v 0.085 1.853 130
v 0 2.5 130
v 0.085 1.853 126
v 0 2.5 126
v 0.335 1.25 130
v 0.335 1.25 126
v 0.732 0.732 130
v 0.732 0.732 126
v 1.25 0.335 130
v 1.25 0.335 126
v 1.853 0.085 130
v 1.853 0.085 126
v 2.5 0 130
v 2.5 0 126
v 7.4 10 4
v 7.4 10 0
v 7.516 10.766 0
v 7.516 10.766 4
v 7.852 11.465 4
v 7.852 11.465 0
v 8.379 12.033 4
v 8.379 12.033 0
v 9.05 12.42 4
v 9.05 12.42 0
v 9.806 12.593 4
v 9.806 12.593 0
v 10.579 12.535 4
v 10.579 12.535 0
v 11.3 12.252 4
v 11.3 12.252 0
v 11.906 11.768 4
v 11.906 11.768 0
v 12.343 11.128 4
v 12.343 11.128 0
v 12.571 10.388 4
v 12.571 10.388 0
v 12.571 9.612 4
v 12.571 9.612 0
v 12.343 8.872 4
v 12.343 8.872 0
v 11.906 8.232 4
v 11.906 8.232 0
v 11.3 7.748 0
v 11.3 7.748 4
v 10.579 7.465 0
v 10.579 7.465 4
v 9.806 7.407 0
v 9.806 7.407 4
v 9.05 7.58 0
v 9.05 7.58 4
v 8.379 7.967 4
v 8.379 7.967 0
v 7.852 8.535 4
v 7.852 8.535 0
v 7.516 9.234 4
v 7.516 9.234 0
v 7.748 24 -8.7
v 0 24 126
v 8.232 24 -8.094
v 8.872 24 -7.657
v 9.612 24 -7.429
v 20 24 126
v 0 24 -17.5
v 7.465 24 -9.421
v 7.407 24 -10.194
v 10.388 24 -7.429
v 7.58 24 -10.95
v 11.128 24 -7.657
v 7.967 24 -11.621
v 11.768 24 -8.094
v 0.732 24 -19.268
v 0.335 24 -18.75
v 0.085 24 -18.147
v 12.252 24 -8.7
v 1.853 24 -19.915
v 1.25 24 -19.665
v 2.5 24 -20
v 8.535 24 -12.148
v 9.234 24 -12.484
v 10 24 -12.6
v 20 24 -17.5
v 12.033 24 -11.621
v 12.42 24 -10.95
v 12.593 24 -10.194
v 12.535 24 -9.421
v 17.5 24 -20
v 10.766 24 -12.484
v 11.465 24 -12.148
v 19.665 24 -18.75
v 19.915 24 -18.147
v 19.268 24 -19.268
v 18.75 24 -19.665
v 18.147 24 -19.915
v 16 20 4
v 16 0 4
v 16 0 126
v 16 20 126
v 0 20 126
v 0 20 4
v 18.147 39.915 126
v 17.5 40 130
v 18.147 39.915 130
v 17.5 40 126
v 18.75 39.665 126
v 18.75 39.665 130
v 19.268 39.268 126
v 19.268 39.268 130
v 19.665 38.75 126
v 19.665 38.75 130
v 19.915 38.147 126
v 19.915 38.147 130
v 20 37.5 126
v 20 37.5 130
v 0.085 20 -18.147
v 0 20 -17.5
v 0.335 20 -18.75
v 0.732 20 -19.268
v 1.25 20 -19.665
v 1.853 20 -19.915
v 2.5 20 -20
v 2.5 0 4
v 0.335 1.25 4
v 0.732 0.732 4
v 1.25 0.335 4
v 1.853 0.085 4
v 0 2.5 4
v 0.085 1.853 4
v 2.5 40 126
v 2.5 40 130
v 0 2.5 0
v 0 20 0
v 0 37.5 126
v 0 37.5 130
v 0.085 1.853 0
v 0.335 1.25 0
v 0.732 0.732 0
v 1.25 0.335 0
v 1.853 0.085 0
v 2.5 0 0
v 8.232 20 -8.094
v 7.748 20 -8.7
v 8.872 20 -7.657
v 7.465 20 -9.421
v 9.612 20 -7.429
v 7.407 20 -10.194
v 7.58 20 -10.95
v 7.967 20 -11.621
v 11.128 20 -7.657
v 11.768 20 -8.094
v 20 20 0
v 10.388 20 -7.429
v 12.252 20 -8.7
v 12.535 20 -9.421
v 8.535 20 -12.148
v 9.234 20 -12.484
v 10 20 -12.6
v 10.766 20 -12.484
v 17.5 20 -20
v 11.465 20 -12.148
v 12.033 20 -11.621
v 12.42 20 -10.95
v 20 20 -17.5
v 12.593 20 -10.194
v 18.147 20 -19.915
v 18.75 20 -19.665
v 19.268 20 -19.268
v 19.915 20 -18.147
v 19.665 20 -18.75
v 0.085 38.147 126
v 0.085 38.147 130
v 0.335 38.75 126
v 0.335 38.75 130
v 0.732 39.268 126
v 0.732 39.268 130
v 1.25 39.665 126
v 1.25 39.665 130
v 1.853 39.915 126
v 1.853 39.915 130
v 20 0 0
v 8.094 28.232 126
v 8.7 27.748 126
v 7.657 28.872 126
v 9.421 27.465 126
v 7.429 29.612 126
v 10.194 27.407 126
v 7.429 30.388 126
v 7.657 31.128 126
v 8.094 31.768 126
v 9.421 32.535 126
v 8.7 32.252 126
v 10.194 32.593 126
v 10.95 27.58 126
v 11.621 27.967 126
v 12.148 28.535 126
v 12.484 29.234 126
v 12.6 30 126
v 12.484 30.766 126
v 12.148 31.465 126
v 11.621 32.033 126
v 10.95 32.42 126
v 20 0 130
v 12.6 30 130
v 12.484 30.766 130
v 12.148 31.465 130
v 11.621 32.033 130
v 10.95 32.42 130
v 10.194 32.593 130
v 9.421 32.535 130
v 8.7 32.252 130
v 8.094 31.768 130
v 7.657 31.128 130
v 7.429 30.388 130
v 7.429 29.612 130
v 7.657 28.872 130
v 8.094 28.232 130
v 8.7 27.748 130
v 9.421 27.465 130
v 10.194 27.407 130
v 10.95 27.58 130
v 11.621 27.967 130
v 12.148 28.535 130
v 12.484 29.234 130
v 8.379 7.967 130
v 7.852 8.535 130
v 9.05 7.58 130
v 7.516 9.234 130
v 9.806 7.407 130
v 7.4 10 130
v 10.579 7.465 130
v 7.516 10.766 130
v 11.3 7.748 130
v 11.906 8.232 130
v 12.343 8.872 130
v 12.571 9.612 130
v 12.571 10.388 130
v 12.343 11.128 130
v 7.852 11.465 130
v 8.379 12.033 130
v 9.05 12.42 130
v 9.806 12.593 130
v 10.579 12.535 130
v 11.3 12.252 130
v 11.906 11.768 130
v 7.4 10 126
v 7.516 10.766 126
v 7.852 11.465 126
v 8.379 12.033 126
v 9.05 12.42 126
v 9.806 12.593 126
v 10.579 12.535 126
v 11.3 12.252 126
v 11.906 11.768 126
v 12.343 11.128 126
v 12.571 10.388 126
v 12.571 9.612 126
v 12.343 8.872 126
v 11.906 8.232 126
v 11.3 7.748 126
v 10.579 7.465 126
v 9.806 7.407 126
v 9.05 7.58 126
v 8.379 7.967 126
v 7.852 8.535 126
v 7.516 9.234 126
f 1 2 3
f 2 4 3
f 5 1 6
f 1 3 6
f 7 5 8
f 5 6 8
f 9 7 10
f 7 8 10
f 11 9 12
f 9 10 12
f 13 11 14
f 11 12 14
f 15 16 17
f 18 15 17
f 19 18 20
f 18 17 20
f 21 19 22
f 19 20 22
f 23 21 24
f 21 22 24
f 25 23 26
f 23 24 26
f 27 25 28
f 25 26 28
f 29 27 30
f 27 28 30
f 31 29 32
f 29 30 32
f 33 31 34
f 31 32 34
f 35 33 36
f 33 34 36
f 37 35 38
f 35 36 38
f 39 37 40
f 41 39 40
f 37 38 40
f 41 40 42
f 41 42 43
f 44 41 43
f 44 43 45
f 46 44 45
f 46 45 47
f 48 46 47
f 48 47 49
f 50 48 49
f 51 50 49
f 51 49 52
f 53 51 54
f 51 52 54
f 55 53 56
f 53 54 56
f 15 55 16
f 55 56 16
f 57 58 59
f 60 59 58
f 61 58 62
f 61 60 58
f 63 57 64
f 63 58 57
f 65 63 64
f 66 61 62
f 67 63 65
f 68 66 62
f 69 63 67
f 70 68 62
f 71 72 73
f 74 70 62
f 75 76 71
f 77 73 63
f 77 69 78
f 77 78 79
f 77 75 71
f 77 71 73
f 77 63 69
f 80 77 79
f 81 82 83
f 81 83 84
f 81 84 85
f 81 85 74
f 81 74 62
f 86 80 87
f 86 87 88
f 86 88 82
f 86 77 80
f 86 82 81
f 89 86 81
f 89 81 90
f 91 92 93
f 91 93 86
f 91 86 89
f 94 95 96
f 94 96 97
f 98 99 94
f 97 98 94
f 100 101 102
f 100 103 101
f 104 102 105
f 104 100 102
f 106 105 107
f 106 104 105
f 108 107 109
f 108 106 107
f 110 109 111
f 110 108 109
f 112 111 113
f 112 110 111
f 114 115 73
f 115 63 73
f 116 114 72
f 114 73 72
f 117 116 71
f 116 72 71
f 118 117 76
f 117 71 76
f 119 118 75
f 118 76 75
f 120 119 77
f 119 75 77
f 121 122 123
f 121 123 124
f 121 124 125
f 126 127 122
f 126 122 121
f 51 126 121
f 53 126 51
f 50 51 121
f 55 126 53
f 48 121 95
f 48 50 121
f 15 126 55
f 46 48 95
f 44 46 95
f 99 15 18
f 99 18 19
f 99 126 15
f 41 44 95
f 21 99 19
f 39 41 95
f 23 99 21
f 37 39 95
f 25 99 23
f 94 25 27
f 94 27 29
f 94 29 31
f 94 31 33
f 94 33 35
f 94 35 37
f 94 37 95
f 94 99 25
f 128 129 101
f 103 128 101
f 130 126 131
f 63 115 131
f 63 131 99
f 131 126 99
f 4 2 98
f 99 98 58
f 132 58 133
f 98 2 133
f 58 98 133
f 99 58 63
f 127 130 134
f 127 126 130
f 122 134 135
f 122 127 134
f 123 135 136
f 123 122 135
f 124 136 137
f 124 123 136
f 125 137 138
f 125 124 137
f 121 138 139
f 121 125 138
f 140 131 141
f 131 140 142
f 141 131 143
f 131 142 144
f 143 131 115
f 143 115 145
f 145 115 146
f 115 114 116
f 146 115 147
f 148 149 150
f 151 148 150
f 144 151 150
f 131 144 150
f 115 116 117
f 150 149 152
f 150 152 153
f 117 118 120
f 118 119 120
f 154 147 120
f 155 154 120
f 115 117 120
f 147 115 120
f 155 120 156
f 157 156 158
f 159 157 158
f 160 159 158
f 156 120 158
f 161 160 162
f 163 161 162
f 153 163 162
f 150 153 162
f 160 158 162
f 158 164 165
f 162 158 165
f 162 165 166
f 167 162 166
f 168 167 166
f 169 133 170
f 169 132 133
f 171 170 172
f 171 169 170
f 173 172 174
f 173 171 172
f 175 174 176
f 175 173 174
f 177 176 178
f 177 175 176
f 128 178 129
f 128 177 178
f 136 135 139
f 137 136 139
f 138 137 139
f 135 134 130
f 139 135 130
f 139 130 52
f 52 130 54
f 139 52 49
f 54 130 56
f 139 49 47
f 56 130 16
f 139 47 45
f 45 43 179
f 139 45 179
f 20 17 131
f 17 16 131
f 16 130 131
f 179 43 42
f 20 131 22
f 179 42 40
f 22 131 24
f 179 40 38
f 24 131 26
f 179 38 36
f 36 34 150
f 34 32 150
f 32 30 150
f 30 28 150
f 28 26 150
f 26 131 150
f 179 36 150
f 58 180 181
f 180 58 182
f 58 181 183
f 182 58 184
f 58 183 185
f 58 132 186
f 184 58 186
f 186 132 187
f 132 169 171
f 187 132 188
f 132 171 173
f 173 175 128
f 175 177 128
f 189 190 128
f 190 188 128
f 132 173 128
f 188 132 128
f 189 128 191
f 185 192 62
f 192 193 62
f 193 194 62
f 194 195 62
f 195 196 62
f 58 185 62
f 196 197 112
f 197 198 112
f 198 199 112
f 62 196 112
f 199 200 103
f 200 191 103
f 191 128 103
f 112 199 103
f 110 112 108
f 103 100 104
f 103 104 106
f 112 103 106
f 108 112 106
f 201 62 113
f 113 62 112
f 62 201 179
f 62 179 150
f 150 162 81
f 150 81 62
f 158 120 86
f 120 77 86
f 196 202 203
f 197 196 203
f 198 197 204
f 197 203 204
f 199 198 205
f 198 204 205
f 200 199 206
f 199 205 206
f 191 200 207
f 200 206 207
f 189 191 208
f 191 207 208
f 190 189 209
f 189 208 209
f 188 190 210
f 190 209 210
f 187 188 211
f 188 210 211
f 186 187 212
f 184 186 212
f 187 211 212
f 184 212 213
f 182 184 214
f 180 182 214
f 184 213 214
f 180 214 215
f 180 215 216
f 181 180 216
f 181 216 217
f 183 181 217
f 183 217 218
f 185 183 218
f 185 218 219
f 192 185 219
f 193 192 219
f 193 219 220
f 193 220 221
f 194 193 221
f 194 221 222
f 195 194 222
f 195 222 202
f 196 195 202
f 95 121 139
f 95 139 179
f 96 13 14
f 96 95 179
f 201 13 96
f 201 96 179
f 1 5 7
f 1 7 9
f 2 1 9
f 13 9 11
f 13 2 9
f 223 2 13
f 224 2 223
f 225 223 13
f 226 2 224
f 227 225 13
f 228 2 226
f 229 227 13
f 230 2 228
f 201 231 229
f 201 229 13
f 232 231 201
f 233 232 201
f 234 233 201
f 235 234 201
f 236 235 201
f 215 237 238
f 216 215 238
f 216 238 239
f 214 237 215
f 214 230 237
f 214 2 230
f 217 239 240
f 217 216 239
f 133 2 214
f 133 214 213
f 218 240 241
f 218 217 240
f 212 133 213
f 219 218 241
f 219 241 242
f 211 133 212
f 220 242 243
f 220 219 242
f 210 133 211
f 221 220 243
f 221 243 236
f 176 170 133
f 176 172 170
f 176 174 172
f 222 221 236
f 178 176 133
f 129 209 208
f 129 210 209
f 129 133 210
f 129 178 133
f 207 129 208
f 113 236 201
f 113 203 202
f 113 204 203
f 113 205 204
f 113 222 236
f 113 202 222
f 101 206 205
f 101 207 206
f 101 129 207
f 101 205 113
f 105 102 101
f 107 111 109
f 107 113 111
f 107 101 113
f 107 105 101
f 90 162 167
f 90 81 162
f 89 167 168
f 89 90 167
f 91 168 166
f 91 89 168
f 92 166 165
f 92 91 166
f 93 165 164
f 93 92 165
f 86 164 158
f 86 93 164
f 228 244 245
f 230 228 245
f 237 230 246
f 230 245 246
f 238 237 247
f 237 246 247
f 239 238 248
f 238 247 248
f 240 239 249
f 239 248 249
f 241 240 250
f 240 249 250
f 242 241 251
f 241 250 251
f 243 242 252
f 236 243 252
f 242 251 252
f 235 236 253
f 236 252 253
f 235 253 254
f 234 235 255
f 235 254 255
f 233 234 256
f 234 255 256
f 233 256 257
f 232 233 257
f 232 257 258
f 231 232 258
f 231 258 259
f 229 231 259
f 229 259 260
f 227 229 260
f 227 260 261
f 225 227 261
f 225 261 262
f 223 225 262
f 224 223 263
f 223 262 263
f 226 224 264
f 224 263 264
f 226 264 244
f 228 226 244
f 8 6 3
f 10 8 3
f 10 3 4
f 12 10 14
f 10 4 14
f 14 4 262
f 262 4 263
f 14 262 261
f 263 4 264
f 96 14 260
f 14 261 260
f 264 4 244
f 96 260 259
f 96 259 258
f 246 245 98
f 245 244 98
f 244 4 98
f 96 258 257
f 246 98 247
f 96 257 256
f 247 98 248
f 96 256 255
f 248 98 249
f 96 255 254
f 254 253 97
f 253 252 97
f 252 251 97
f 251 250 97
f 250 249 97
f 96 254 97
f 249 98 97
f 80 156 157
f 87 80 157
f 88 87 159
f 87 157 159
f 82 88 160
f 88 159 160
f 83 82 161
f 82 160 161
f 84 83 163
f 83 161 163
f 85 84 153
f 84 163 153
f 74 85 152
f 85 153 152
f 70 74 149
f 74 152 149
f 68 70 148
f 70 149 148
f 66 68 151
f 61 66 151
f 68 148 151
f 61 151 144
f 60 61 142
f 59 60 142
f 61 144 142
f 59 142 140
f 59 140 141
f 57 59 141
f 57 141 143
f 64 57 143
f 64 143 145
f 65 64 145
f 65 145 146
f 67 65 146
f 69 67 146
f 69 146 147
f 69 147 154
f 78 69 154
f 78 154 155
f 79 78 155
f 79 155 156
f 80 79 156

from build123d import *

# Parameters (mm, degrees)
SKETCH_1_W                  = 20
SKETCH_1_H                  = 20
EXTRUDE_1_DEPTH             = 4
EXTRUDE_2_DEPTH             = 130
EXTRUDE_2_DEPTH_BACK        = 20
SKETCH_2_W                  = 20
SKETCH_2_H                  = 4
SKETCH_3_W                  = 4
SKETCH_3_H                  = 24
EXTRUDE_3_DEPTH             = 130
SKETCH_4_W                  = 20
SKETCH_4_H                  = 40
EXTRUDE_4_DEPTH             = 4
HOLE_WIZARD_M53_D           = 5.2
HOLE_WIZARD_M53_ON_FACE_2_D = 5.2
HOLE_WIZARD_M53_ON_FACE_3_D = 5.2
FILLET_1_R                  = 2.5


with BuildPart() as part:
    # Эскиз1 → Бобышка-Вытянуть1 (new body)
    with BuildSketch(Plane.XY):
        with Locations((10, 10)):
            Rectangle(SKETCH_1_W, SKETCH_1_H)
    extrude(amount=EXTRUDE_1_DEPTH)

    # Эскиз2 → Бобышка-Вытянуть2 (add, two sides: drawn at the far end of the back side and taken through both)
    with BuildSketch(Plane.XY.offset(-EXTRUDE_2_DEPTH_BACK)):
        with Locations((10, 22)):
            Rectangle(SKETCH_2_W, SKETCH_2_H)
    extrude(amount=EXTRUDE_2_DEPTH + EXTRUDE_2_DEPTH_BACK)

    # Эскиз3 → Бобышка-Вытянуть3 (add)
    with BuildSketch(Plane(origin=(0, 0, 0), x_dir=(-1, 0, 0), z_dir=(0, 0, -1))):
        with Locations((-18, 12)):
            Rectangle(SKETCH_3_W, SKETCH_3_H)
    extrude(amount=-EXTRUDE_3_DEPTH)

    # Эскиз4 → Бобышка-Вытянуть4 (add)
    with BuildSketch(Plane.XY.offset(130)):
        with Locations((10, 20)):
            Rectangle(SKETCH_4_W, SKETCH_4_H)
    extrude(amount=-EXTRUDE_4_DEPTH)

    # Отверстие с зазором M53 (through all)
    with Locations(Plane(origin=(10, 10, 4), x_dir=(1, 0, 0), z_dir=(0, 0, 1))):
        with Locations((0, 0)):
            Hole(HOLE_WIZARD_M53_D / 2)

    # Отверстие с зазором M53 on face 2 (through all)
    with Locations(Plane(origin=(10, 24, -10), x_dir=(0, 0, 1), z_dir=(0, 1, 0))):
        with Locations((0, 0)):
            Hole(HOLE_WIZARD_M53_ON_FACE_2_D / 2)

    # Отверстие с зазором M53 on face 3 (through all)
    with Locations(Plane(origin=(10, 30, 126), x_dir=(-1, 0, 0), z_dir=(0, 0, -1))):
        with Locations((0, 0), (0, -20)):
            Hole(HOLE_WIZARD_M53_ON_FACE_3_D / 2)

    # Скругление1
    fillet_1_edges = [part.edges().sort_by_distance(p)[0] for p in [
        (0, 22, -20),
        (20, 22, -20),
        (0, 0, 128),
        (20, 40, 128),
        (0, 40, 128),
        (0, 0, 2),
    ]]
    fillet(fillet_1_edges, radius=FILLET_1_R)


solid = part.part
